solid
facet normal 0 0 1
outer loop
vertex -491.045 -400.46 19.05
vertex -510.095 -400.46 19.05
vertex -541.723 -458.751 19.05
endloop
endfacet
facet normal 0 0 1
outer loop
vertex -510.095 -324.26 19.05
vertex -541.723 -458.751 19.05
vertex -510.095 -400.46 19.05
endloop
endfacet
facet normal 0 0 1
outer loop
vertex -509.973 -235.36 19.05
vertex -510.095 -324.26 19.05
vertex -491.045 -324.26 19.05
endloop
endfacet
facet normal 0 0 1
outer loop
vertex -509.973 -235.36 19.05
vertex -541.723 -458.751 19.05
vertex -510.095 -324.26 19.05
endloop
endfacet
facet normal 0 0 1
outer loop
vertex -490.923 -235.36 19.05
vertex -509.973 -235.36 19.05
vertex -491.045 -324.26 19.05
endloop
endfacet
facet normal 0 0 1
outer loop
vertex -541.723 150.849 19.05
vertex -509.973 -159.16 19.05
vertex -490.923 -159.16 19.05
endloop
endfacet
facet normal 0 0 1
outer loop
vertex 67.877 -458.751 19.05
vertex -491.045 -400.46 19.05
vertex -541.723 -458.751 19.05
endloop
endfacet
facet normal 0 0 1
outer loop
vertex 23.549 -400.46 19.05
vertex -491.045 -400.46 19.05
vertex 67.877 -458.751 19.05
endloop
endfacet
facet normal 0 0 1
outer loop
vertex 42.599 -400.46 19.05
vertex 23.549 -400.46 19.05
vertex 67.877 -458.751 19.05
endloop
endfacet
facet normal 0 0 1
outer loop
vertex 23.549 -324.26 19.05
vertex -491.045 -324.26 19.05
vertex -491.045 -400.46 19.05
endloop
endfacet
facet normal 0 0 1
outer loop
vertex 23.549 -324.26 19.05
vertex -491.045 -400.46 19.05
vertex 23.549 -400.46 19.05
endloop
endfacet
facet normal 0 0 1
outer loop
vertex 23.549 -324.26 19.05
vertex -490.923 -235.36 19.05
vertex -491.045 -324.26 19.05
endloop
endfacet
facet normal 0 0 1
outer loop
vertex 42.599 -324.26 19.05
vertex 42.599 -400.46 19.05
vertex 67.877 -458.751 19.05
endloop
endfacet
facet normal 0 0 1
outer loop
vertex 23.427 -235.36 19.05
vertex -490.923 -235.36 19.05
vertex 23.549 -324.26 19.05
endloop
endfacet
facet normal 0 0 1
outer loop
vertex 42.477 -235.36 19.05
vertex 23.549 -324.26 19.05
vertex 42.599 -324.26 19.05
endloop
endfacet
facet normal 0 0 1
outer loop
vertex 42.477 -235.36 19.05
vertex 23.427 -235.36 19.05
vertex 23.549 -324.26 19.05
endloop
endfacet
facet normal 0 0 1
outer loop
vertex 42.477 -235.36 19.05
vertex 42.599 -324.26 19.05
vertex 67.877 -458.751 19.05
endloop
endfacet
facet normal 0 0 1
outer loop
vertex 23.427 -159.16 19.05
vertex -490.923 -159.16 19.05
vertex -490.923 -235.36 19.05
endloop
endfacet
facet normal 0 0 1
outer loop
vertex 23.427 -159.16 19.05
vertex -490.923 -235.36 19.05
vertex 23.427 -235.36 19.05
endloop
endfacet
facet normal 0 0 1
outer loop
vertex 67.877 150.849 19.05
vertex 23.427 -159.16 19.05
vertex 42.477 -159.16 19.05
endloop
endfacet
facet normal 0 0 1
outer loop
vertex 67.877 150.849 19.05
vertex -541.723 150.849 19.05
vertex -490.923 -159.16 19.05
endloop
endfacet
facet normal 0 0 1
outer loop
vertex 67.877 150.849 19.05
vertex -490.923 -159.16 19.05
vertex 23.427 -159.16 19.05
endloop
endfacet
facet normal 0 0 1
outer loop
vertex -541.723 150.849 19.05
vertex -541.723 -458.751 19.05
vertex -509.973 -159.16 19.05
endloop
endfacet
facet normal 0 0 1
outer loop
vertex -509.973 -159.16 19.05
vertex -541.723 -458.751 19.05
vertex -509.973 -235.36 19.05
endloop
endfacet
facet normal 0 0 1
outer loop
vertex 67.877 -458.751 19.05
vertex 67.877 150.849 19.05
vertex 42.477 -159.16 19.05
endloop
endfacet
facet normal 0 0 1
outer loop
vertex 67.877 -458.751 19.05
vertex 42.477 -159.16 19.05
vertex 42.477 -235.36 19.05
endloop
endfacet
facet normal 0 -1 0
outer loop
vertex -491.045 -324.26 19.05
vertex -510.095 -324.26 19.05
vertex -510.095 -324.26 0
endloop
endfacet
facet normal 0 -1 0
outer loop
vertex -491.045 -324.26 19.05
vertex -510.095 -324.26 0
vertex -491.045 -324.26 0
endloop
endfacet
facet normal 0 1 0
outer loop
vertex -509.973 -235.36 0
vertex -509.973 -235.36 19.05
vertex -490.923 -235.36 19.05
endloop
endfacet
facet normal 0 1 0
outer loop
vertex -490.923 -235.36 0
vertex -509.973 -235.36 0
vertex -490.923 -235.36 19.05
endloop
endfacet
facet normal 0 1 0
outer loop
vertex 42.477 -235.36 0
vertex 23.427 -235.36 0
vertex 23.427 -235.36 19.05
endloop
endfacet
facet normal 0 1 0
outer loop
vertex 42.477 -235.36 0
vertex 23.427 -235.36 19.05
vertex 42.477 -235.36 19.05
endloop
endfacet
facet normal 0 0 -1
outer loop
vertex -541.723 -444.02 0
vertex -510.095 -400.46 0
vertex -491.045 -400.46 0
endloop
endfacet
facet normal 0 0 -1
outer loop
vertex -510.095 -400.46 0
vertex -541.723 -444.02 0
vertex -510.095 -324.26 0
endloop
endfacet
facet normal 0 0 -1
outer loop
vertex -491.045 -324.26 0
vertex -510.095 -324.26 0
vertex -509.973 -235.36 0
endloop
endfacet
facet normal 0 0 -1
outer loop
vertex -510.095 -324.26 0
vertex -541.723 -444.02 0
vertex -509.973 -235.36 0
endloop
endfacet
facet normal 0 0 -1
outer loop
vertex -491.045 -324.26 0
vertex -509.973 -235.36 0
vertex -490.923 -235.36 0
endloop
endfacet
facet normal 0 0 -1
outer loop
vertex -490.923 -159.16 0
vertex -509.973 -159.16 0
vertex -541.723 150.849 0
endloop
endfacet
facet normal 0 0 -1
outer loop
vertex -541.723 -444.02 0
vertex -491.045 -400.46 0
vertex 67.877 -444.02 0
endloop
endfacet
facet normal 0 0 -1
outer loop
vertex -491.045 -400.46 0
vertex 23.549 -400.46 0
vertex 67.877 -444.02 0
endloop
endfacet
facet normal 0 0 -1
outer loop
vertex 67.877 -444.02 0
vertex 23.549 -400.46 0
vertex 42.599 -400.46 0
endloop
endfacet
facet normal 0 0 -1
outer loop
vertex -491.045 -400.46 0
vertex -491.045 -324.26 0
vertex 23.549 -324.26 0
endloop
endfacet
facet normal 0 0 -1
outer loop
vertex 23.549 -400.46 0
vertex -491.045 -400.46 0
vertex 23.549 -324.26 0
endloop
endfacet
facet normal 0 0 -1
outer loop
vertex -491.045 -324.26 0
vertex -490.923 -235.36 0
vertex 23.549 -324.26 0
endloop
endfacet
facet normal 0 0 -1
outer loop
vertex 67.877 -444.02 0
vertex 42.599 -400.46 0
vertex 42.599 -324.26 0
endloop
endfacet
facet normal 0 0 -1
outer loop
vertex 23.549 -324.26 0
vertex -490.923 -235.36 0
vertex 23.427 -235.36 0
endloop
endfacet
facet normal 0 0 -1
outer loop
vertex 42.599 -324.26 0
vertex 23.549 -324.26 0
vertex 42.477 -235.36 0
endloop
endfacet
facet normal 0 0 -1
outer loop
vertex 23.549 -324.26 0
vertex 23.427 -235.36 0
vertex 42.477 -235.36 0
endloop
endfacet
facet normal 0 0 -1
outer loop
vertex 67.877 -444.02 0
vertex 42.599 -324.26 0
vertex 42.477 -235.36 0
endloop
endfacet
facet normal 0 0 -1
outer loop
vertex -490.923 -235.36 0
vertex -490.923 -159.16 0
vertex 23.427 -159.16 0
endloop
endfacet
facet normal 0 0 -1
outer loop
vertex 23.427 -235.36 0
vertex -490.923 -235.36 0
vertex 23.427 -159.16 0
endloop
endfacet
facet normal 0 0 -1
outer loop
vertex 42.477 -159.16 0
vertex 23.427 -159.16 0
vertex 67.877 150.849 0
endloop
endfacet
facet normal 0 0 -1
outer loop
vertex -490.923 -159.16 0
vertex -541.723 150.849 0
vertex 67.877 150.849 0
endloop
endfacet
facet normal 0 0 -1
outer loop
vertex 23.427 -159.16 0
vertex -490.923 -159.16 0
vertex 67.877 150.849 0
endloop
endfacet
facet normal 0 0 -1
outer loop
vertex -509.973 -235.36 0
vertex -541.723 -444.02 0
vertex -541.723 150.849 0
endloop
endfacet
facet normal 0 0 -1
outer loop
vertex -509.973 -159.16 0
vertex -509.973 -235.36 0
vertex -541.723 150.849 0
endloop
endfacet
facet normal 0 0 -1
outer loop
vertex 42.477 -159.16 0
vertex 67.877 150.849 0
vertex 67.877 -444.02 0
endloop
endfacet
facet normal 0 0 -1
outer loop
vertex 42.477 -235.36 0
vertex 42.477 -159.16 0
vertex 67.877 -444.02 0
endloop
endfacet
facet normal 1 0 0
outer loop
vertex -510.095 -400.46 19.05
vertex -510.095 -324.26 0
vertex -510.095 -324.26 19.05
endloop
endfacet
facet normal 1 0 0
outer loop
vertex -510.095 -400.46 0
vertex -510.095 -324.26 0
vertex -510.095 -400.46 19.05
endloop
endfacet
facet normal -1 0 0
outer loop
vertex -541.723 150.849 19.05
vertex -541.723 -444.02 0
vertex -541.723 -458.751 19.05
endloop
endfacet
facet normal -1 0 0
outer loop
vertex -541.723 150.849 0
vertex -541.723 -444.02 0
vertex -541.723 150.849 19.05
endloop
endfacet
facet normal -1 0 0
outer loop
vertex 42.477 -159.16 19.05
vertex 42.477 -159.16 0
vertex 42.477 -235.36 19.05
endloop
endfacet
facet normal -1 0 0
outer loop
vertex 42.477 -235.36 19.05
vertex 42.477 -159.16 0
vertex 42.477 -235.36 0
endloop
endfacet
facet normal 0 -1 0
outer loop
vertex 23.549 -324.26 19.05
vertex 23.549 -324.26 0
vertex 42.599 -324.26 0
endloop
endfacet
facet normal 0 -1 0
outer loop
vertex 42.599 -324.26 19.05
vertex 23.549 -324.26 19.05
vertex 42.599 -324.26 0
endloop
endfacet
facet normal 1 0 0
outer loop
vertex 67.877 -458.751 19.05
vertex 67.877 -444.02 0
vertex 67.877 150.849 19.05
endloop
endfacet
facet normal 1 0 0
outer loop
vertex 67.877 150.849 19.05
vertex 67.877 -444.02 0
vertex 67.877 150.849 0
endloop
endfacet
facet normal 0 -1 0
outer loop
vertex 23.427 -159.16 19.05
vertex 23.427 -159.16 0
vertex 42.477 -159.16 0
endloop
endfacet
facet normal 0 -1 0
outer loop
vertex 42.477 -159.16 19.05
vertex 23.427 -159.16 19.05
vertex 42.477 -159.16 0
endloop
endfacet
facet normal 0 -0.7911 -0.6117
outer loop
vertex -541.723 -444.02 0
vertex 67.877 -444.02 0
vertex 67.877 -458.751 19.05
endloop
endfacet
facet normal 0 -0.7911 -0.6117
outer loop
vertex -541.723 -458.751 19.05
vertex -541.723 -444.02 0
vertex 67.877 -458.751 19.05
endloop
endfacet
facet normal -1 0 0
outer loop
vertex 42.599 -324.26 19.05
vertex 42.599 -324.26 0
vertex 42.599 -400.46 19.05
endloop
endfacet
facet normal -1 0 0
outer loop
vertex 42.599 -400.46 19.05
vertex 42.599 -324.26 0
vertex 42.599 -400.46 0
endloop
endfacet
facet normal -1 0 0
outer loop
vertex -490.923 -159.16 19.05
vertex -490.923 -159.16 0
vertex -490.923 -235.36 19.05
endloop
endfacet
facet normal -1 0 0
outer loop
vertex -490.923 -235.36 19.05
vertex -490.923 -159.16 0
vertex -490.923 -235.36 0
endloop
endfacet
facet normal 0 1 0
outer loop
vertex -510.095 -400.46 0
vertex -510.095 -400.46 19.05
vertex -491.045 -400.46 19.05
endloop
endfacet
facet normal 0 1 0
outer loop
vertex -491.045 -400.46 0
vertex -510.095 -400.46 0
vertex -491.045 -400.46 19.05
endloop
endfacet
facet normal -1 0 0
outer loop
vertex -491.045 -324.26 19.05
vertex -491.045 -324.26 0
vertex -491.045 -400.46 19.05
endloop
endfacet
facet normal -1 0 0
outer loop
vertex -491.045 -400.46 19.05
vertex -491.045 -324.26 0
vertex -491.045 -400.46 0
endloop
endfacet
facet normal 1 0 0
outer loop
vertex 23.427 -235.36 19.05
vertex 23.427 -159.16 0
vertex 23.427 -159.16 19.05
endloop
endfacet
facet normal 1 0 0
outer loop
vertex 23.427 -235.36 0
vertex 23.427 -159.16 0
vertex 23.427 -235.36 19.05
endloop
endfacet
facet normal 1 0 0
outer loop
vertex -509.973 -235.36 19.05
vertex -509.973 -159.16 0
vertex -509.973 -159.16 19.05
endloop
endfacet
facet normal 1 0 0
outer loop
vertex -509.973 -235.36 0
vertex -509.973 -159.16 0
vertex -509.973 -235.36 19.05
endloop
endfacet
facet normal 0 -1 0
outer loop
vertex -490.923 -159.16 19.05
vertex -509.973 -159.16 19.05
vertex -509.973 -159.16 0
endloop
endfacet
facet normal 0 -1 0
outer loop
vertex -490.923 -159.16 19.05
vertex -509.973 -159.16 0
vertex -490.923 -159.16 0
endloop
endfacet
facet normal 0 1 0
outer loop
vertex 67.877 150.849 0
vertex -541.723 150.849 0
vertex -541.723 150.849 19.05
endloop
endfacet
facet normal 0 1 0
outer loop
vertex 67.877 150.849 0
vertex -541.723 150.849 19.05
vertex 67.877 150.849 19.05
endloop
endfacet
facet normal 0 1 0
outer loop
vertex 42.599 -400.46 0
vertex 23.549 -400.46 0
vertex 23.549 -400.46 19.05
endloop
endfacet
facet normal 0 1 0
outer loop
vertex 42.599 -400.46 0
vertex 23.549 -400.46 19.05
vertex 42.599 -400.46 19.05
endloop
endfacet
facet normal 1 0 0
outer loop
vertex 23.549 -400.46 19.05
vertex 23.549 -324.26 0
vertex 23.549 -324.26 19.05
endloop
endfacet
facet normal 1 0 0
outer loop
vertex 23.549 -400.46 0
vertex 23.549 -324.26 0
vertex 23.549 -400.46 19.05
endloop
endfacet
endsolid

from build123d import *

# Parameters (mm, degrees)
F0_W     = 609.6
F0_H     = 609.6
F1_DEPTH = 19.05
F4_DEPTH = 747.014
F2_W     = 19.05
F2_H     = 76.2
F5_DEPTH = 25.4


with BuildPart() as f1:
    # F0 (on Top) → F1 (new body)
    with BuildSketch(Plane.XY):
        with Locations((-236.922948, -153.95108)):
            Rectangle(F0_W, F0_H)
    extrude(amount=F1_DEPTH)

    # F3 (on face) → F4 (cut)
    with BuildSketch(Plane.YZ.offset(67.877052)):
        Polygon((-444.019914, 0), (-458.75108, 19.05), (-458.75108, 0), align=None)
    extrude(amount=-F4_DEPTH, mode=Mode.SUBTRACT)

    # F2 (on face) → F5 (cut)
    with BuildSketch(Plane(origin=(0, 0, 0), x_dir=(1, 0, 0), z_dir=(0, 0, -1))):
        with Locations((-500.570309, 362.360354)):
            Rectangle(F2_W, F2_H)
        with Locations((-500.447948, 197.260354)):
            Rectangle(F2_W, F2_H)
        with Locations((32.952052, 197.260354)):
            Rectangle(F2_W, F2_H)
        with Locations((33.074412, 362.360354)):
            Rectangle(F2_W, F2_H)
    extrude(amount=-F5_DEPTH, mode=Mode.SUBTRACT)


solid = f1.part
